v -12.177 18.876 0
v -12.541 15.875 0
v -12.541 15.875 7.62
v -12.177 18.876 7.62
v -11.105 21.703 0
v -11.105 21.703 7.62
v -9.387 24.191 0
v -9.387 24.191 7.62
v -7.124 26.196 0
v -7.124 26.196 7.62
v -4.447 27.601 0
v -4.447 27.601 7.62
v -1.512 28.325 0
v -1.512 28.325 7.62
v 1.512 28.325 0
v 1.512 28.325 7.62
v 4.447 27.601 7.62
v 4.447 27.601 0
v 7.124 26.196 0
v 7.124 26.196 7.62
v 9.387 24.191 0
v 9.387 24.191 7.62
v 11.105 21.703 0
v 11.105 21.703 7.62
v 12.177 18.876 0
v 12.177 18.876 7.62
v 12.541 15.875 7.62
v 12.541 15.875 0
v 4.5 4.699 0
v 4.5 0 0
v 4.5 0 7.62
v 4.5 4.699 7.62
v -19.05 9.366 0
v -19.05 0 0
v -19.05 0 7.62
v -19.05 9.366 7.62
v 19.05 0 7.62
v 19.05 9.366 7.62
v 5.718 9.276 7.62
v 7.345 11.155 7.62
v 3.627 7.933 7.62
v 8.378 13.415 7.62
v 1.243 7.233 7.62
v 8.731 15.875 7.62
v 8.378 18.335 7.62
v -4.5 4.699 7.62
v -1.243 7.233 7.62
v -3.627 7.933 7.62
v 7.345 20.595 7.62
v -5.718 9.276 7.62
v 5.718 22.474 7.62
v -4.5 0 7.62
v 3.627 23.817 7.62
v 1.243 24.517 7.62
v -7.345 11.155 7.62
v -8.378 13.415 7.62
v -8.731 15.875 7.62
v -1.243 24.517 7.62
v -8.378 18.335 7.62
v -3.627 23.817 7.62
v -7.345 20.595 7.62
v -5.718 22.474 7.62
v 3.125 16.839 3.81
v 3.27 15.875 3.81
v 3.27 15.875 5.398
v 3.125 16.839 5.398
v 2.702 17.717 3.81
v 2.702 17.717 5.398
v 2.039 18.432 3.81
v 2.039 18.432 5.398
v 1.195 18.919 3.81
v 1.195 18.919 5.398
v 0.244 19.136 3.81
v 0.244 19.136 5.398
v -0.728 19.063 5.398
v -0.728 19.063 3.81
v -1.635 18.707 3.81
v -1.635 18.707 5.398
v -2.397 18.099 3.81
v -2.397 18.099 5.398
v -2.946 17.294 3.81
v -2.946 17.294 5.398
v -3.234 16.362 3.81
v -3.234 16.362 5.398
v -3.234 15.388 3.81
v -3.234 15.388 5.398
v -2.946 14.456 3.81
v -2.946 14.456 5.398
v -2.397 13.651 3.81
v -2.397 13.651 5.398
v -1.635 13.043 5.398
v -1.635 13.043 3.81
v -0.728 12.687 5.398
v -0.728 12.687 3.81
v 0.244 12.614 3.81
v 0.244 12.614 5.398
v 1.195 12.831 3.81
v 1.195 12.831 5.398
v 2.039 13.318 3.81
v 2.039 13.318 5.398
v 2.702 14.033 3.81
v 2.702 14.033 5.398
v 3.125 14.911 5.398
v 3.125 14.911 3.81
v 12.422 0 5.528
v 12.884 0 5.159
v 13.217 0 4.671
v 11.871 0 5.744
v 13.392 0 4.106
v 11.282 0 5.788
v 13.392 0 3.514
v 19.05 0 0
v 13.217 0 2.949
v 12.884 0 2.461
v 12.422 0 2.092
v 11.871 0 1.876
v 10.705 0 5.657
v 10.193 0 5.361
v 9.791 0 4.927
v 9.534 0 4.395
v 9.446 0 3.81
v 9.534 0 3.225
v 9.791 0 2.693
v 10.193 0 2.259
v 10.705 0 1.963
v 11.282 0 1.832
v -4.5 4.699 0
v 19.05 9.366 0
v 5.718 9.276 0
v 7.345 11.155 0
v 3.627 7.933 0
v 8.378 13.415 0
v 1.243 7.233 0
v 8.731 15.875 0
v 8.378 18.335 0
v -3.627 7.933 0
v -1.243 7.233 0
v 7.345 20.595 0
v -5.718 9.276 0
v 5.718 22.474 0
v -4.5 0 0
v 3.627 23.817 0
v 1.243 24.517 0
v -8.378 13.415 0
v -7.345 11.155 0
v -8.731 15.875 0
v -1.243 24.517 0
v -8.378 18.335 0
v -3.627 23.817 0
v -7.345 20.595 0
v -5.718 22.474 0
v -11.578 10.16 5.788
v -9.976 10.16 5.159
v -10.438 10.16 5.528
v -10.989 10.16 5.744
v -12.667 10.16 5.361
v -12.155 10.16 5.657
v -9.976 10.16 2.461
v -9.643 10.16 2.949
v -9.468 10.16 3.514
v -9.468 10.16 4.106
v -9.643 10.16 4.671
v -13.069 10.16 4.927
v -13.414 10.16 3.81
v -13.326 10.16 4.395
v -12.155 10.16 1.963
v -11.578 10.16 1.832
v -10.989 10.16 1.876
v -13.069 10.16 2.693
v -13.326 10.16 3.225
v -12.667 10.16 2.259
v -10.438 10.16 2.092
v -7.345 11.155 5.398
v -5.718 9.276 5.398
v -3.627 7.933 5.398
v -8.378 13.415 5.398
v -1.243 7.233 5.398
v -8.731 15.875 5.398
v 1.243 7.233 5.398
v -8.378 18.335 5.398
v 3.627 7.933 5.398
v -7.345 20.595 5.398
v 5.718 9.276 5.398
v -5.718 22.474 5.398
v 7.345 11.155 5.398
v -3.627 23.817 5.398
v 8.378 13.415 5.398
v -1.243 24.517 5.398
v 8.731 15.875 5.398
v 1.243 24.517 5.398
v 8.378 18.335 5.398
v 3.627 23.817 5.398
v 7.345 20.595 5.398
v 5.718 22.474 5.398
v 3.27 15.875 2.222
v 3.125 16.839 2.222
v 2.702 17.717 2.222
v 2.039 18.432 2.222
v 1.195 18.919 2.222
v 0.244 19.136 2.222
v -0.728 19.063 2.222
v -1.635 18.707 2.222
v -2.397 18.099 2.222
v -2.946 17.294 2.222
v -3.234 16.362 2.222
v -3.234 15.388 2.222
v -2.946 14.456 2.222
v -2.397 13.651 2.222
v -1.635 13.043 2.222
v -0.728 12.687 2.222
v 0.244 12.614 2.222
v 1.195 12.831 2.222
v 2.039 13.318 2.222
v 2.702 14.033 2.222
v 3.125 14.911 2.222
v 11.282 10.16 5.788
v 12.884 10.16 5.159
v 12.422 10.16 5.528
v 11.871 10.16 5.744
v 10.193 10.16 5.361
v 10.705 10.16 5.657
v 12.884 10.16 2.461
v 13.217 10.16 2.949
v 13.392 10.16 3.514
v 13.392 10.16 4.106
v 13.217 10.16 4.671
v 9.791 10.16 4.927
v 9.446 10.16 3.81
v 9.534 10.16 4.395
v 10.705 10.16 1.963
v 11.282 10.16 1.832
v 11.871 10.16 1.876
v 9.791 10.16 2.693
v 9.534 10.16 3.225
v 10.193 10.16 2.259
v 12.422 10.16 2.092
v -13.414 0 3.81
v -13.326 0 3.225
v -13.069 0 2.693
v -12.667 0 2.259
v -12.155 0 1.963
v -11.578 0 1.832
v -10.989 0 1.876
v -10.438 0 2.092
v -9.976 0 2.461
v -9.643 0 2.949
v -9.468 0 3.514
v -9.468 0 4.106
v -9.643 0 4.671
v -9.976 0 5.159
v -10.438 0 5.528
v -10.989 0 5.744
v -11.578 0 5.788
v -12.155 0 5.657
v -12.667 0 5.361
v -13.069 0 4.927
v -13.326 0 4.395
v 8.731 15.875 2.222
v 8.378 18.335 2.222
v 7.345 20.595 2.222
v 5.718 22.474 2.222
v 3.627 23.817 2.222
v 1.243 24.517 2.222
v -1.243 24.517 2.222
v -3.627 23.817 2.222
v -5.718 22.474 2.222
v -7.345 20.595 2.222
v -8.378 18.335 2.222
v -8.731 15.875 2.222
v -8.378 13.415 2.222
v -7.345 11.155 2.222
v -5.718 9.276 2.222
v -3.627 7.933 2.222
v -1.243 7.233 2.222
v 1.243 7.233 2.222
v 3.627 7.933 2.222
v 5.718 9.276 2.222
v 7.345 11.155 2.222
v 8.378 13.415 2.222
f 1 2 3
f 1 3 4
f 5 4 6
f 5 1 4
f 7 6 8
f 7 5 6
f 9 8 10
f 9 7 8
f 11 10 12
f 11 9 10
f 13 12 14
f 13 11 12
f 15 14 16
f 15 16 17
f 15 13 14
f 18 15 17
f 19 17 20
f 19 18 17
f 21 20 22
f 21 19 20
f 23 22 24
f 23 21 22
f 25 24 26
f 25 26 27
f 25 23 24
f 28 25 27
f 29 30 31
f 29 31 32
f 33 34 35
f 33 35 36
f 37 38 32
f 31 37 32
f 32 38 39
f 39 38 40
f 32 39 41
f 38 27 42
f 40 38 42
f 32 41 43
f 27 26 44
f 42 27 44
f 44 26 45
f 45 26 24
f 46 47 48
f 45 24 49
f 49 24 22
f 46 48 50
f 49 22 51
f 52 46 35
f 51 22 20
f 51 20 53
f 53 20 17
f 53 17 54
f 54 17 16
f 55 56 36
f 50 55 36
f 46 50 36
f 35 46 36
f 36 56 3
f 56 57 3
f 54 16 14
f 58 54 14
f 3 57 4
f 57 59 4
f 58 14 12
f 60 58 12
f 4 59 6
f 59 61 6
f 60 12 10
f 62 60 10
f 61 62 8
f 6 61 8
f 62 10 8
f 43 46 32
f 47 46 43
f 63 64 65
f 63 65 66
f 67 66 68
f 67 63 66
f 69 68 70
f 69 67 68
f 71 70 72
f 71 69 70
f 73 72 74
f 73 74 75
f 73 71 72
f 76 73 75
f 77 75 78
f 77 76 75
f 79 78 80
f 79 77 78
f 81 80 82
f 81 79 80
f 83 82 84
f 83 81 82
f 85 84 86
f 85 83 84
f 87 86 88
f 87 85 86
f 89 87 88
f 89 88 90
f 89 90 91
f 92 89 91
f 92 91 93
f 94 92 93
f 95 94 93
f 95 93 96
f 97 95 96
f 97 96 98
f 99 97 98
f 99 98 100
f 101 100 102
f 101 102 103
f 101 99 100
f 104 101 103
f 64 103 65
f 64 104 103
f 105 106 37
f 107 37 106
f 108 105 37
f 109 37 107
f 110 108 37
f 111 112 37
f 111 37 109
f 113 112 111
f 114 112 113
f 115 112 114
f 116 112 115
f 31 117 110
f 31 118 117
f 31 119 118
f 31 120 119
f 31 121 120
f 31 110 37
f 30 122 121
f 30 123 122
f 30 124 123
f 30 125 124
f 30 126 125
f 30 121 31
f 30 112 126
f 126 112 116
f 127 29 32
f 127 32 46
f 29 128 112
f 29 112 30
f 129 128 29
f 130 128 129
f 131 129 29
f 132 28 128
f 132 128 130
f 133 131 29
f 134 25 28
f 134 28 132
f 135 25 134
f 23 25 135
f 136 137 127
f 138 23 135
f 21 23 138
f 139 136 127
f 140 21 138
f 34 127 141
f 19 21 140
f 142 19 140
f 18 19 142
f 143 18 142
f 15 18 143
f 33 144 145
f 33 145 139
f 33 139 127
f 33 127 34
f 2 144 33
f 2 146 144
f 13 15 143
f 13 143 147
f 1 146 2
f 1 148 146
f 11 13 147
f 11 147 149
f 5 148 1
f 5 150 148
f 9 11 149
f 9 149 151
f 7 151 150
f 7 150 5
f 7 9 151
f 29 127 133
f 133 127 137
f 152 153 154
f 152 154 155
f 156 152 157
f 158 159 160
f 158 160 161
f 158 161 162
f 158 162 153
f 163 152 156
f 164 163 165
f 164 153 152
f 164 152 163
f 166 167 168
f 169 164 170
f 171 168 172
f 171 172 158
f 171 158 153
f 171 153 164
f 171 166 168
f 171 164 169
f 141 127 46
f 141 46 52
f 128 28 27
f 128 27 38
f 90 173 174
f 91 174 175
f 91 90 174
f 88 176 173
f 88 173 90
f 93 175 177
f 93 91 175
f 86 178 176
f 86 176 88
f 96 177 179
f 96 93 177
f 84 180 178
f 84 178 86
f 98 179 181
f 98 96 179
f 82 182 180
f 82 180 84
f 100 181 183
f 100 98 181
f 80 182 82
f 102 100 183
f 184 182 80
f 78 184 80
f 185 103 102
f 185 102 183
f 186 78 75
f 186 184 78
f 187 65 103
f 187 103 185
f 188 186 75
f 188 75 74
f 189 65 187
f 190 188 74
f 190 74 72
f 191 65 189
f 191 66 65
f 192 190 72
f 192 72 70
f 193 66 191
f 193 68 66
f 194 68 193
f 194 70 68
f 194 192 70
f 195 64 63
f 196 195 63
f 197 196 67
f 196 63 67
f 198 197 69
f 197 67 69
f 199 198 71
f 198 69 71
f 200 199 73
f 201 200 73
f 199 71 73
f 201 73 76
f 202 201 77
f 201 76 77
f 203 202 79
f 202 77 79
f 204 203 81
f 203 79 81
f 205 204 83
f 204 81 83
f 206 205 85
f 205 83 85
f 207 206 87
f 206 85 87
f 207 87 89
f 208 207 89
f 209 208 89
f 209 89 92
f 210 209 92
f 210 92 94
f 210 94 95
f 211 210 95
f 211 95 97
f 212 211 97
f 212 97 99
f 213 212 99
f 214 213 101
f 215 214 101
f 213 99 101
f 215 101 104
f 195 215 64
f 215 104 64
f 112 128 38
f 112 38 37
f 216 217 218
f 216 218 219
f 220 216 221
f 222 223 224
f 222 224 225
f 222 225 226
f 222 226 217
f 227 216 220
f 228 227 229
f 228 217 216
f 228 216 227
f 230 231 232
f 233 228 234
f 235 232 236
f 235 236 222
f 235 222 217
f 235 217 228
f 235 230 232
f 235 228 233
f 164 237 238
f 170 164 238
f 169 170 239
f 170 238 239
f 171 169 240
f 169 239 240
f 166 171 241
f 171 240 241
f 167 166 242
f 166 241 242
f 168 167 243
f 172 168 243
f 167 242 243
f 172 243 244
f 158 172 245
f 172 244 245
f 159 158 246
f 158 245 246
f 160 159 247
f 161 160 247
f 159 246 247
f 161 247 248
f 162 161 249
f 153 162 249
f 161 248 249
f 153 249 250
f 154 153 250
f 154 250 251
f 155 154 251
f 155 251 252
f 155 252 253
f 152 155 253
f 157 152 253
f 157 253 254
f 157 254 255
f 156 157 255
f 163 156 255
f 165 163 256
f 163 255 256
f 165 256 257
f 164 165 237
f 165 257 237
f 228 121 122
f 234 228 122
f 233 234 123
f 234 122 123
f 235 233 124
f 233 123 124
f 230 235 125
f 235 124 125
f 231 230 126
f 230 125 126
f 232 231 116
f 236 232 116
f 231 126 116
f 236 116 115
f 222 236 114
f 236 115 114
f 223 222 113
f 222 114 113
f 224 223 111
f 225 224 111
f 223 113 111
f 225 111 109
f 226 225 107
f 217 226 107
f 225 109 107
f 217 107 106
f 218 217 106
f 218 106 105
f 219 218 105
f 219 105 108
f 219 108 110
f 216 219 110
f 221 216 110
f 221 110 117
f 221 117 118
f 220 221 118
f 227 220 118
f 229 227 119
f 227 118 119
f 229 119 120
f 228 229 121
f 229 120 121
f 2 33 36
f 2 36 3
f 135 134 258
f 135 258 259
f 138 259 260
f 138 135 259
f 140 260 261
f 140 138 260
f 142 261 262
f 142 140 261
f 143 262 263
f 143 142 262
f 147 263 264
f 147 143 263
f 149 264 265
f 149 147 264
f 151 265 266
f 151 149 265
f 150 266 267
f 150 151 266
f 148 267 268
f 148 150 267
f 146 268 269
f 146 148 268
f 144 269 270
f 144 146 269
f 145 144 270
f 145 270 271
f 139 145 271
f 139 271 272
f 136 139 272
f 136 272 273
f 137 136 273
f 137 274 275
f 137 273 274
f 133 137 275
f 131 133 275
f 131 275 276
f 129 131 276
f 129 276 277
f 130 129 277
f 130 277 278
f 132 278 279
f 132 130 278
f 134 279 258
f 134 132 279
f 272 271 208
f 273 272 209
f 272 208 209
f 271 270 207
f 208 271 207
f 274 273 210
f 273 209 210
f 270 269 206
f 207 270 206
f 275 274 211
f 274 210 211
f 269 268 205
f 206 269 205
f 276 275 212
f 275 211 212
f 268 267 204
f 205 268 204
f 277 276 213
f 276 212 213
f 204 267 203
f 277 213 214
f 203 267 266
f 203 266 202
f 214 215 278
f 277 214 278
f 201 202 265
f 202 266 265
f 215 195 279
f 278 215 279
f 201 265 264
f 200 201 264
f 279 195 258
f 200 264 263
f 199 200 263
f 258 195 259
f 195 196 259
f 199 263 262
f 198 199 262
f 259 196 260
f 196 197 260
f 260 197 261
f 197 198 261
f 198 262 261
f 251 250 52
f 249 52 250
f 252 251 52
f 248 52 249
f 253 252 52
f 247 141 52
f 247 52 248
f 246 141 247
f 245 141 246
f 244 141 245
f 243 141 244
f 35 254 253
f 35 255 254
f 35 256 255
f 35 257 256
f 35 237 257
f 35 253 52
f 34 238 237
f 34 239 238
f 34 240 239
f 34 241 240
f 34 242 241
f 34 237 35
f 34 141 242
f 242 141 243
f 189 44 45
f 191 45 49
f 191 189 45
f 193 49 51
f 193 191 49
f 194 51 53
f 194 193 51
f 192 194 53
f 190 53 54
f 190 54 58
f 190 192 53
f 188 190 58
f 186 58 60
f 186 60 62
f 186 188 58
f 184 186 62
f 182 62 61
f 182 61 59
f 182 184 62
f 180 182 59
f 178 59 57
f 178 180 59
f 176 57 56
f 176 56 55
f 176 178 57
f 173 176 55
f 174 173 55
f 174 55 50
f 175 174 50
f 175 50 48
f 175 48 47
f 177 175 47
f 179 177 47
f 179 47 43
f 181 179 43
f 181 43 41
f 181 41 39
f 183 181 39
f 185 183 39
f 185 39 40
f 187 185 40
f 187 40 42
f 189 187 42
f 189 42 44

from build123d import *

# Parameters (mm, degrees)
SKETCH1_R                = 8.73125
BOSS_EXTRUDE1_DEPTH      = 7.62
SKETCH3_R                = 8.7376
SKETCH3_R_2              = 3.27025
BOSS_EXTRUDE2_DEPTH      = 1.5875
BOSS_EXTRUDE2_DEPTH_BACK = 1.5875
SKETCH4_R                = 1.98374
CUT_EXTRUDE1_DEPTH       = 10.16


with BuildPart() as part:
    # Sketch1 → Boss-Extrude1 (new body)
    with BuildSketch(Plane.XY):
        with BuildLine():
            Line((4.5, 4.699), (-4.5, 4.699))
            Line((-4.5, 4.699), (-4.5, 0))
            Line((-4.5, 0), (-19.05, 0))
            Line((-19.05, 0), (-19.05, 9.36625))
            Line((-19.05, 9.36625), (-12.54125, 15.875))
            ThreePointArc((-12.54125, 15.875), (0, 28.41625), (12.54125, 15.875))
            Line((12.54125, 15.875), (19.05, 9.36625))
            Line((19.05, 9.36625), (19.05, 0))
            Line((19.05, 0), (4.5, 0))
            Line((4.5, 0), (4.5, 4.699))
        make_face()
        with Locations((0, 15.875)):
            Circle(SKETCH1_R, mode=Mode.SUBTRACT)
    extrude(amount=BOSS_EXTRUDE1_DEPTH)

    # Sketch3 → Boss-Extrude2 (add, two sides)
    with BuildSketch(Plane.XY.offset(3.81)) as boss_extrude2_sk:
        with Locations((0, 15.875)):
            Circle(SKETCH3_R)
        with Locations((0, 15.875)):
            Circle(SKETCH3_R_2, mode=Mode.SUBTRACT)
    extrude(amount=BOSS_EXTRUDE2_DEPTH)
    extrude(boss_extrude2_sk.sketch, amount=-BOSS_EXTRUDE2_DEPTH_BACK)

    # Sketch4 → Cut-Extrude1 (cut)
    with BuildSketch(Plane(origin=(0, 0, 0), x_dir=(-1, 0, 0), z_dir=(0, -1, 0))):
        with Locations((-11.43, -3.81)):
            Circle(SKETCH4_R)
        with Locations((11.43, -3.81)):
            Circle(SKETCH4_R)
    extrude(amount=-CUT_EXTRUDE1_DEPTH, mode=Mode.SUBTRACT)


solid = part.part
